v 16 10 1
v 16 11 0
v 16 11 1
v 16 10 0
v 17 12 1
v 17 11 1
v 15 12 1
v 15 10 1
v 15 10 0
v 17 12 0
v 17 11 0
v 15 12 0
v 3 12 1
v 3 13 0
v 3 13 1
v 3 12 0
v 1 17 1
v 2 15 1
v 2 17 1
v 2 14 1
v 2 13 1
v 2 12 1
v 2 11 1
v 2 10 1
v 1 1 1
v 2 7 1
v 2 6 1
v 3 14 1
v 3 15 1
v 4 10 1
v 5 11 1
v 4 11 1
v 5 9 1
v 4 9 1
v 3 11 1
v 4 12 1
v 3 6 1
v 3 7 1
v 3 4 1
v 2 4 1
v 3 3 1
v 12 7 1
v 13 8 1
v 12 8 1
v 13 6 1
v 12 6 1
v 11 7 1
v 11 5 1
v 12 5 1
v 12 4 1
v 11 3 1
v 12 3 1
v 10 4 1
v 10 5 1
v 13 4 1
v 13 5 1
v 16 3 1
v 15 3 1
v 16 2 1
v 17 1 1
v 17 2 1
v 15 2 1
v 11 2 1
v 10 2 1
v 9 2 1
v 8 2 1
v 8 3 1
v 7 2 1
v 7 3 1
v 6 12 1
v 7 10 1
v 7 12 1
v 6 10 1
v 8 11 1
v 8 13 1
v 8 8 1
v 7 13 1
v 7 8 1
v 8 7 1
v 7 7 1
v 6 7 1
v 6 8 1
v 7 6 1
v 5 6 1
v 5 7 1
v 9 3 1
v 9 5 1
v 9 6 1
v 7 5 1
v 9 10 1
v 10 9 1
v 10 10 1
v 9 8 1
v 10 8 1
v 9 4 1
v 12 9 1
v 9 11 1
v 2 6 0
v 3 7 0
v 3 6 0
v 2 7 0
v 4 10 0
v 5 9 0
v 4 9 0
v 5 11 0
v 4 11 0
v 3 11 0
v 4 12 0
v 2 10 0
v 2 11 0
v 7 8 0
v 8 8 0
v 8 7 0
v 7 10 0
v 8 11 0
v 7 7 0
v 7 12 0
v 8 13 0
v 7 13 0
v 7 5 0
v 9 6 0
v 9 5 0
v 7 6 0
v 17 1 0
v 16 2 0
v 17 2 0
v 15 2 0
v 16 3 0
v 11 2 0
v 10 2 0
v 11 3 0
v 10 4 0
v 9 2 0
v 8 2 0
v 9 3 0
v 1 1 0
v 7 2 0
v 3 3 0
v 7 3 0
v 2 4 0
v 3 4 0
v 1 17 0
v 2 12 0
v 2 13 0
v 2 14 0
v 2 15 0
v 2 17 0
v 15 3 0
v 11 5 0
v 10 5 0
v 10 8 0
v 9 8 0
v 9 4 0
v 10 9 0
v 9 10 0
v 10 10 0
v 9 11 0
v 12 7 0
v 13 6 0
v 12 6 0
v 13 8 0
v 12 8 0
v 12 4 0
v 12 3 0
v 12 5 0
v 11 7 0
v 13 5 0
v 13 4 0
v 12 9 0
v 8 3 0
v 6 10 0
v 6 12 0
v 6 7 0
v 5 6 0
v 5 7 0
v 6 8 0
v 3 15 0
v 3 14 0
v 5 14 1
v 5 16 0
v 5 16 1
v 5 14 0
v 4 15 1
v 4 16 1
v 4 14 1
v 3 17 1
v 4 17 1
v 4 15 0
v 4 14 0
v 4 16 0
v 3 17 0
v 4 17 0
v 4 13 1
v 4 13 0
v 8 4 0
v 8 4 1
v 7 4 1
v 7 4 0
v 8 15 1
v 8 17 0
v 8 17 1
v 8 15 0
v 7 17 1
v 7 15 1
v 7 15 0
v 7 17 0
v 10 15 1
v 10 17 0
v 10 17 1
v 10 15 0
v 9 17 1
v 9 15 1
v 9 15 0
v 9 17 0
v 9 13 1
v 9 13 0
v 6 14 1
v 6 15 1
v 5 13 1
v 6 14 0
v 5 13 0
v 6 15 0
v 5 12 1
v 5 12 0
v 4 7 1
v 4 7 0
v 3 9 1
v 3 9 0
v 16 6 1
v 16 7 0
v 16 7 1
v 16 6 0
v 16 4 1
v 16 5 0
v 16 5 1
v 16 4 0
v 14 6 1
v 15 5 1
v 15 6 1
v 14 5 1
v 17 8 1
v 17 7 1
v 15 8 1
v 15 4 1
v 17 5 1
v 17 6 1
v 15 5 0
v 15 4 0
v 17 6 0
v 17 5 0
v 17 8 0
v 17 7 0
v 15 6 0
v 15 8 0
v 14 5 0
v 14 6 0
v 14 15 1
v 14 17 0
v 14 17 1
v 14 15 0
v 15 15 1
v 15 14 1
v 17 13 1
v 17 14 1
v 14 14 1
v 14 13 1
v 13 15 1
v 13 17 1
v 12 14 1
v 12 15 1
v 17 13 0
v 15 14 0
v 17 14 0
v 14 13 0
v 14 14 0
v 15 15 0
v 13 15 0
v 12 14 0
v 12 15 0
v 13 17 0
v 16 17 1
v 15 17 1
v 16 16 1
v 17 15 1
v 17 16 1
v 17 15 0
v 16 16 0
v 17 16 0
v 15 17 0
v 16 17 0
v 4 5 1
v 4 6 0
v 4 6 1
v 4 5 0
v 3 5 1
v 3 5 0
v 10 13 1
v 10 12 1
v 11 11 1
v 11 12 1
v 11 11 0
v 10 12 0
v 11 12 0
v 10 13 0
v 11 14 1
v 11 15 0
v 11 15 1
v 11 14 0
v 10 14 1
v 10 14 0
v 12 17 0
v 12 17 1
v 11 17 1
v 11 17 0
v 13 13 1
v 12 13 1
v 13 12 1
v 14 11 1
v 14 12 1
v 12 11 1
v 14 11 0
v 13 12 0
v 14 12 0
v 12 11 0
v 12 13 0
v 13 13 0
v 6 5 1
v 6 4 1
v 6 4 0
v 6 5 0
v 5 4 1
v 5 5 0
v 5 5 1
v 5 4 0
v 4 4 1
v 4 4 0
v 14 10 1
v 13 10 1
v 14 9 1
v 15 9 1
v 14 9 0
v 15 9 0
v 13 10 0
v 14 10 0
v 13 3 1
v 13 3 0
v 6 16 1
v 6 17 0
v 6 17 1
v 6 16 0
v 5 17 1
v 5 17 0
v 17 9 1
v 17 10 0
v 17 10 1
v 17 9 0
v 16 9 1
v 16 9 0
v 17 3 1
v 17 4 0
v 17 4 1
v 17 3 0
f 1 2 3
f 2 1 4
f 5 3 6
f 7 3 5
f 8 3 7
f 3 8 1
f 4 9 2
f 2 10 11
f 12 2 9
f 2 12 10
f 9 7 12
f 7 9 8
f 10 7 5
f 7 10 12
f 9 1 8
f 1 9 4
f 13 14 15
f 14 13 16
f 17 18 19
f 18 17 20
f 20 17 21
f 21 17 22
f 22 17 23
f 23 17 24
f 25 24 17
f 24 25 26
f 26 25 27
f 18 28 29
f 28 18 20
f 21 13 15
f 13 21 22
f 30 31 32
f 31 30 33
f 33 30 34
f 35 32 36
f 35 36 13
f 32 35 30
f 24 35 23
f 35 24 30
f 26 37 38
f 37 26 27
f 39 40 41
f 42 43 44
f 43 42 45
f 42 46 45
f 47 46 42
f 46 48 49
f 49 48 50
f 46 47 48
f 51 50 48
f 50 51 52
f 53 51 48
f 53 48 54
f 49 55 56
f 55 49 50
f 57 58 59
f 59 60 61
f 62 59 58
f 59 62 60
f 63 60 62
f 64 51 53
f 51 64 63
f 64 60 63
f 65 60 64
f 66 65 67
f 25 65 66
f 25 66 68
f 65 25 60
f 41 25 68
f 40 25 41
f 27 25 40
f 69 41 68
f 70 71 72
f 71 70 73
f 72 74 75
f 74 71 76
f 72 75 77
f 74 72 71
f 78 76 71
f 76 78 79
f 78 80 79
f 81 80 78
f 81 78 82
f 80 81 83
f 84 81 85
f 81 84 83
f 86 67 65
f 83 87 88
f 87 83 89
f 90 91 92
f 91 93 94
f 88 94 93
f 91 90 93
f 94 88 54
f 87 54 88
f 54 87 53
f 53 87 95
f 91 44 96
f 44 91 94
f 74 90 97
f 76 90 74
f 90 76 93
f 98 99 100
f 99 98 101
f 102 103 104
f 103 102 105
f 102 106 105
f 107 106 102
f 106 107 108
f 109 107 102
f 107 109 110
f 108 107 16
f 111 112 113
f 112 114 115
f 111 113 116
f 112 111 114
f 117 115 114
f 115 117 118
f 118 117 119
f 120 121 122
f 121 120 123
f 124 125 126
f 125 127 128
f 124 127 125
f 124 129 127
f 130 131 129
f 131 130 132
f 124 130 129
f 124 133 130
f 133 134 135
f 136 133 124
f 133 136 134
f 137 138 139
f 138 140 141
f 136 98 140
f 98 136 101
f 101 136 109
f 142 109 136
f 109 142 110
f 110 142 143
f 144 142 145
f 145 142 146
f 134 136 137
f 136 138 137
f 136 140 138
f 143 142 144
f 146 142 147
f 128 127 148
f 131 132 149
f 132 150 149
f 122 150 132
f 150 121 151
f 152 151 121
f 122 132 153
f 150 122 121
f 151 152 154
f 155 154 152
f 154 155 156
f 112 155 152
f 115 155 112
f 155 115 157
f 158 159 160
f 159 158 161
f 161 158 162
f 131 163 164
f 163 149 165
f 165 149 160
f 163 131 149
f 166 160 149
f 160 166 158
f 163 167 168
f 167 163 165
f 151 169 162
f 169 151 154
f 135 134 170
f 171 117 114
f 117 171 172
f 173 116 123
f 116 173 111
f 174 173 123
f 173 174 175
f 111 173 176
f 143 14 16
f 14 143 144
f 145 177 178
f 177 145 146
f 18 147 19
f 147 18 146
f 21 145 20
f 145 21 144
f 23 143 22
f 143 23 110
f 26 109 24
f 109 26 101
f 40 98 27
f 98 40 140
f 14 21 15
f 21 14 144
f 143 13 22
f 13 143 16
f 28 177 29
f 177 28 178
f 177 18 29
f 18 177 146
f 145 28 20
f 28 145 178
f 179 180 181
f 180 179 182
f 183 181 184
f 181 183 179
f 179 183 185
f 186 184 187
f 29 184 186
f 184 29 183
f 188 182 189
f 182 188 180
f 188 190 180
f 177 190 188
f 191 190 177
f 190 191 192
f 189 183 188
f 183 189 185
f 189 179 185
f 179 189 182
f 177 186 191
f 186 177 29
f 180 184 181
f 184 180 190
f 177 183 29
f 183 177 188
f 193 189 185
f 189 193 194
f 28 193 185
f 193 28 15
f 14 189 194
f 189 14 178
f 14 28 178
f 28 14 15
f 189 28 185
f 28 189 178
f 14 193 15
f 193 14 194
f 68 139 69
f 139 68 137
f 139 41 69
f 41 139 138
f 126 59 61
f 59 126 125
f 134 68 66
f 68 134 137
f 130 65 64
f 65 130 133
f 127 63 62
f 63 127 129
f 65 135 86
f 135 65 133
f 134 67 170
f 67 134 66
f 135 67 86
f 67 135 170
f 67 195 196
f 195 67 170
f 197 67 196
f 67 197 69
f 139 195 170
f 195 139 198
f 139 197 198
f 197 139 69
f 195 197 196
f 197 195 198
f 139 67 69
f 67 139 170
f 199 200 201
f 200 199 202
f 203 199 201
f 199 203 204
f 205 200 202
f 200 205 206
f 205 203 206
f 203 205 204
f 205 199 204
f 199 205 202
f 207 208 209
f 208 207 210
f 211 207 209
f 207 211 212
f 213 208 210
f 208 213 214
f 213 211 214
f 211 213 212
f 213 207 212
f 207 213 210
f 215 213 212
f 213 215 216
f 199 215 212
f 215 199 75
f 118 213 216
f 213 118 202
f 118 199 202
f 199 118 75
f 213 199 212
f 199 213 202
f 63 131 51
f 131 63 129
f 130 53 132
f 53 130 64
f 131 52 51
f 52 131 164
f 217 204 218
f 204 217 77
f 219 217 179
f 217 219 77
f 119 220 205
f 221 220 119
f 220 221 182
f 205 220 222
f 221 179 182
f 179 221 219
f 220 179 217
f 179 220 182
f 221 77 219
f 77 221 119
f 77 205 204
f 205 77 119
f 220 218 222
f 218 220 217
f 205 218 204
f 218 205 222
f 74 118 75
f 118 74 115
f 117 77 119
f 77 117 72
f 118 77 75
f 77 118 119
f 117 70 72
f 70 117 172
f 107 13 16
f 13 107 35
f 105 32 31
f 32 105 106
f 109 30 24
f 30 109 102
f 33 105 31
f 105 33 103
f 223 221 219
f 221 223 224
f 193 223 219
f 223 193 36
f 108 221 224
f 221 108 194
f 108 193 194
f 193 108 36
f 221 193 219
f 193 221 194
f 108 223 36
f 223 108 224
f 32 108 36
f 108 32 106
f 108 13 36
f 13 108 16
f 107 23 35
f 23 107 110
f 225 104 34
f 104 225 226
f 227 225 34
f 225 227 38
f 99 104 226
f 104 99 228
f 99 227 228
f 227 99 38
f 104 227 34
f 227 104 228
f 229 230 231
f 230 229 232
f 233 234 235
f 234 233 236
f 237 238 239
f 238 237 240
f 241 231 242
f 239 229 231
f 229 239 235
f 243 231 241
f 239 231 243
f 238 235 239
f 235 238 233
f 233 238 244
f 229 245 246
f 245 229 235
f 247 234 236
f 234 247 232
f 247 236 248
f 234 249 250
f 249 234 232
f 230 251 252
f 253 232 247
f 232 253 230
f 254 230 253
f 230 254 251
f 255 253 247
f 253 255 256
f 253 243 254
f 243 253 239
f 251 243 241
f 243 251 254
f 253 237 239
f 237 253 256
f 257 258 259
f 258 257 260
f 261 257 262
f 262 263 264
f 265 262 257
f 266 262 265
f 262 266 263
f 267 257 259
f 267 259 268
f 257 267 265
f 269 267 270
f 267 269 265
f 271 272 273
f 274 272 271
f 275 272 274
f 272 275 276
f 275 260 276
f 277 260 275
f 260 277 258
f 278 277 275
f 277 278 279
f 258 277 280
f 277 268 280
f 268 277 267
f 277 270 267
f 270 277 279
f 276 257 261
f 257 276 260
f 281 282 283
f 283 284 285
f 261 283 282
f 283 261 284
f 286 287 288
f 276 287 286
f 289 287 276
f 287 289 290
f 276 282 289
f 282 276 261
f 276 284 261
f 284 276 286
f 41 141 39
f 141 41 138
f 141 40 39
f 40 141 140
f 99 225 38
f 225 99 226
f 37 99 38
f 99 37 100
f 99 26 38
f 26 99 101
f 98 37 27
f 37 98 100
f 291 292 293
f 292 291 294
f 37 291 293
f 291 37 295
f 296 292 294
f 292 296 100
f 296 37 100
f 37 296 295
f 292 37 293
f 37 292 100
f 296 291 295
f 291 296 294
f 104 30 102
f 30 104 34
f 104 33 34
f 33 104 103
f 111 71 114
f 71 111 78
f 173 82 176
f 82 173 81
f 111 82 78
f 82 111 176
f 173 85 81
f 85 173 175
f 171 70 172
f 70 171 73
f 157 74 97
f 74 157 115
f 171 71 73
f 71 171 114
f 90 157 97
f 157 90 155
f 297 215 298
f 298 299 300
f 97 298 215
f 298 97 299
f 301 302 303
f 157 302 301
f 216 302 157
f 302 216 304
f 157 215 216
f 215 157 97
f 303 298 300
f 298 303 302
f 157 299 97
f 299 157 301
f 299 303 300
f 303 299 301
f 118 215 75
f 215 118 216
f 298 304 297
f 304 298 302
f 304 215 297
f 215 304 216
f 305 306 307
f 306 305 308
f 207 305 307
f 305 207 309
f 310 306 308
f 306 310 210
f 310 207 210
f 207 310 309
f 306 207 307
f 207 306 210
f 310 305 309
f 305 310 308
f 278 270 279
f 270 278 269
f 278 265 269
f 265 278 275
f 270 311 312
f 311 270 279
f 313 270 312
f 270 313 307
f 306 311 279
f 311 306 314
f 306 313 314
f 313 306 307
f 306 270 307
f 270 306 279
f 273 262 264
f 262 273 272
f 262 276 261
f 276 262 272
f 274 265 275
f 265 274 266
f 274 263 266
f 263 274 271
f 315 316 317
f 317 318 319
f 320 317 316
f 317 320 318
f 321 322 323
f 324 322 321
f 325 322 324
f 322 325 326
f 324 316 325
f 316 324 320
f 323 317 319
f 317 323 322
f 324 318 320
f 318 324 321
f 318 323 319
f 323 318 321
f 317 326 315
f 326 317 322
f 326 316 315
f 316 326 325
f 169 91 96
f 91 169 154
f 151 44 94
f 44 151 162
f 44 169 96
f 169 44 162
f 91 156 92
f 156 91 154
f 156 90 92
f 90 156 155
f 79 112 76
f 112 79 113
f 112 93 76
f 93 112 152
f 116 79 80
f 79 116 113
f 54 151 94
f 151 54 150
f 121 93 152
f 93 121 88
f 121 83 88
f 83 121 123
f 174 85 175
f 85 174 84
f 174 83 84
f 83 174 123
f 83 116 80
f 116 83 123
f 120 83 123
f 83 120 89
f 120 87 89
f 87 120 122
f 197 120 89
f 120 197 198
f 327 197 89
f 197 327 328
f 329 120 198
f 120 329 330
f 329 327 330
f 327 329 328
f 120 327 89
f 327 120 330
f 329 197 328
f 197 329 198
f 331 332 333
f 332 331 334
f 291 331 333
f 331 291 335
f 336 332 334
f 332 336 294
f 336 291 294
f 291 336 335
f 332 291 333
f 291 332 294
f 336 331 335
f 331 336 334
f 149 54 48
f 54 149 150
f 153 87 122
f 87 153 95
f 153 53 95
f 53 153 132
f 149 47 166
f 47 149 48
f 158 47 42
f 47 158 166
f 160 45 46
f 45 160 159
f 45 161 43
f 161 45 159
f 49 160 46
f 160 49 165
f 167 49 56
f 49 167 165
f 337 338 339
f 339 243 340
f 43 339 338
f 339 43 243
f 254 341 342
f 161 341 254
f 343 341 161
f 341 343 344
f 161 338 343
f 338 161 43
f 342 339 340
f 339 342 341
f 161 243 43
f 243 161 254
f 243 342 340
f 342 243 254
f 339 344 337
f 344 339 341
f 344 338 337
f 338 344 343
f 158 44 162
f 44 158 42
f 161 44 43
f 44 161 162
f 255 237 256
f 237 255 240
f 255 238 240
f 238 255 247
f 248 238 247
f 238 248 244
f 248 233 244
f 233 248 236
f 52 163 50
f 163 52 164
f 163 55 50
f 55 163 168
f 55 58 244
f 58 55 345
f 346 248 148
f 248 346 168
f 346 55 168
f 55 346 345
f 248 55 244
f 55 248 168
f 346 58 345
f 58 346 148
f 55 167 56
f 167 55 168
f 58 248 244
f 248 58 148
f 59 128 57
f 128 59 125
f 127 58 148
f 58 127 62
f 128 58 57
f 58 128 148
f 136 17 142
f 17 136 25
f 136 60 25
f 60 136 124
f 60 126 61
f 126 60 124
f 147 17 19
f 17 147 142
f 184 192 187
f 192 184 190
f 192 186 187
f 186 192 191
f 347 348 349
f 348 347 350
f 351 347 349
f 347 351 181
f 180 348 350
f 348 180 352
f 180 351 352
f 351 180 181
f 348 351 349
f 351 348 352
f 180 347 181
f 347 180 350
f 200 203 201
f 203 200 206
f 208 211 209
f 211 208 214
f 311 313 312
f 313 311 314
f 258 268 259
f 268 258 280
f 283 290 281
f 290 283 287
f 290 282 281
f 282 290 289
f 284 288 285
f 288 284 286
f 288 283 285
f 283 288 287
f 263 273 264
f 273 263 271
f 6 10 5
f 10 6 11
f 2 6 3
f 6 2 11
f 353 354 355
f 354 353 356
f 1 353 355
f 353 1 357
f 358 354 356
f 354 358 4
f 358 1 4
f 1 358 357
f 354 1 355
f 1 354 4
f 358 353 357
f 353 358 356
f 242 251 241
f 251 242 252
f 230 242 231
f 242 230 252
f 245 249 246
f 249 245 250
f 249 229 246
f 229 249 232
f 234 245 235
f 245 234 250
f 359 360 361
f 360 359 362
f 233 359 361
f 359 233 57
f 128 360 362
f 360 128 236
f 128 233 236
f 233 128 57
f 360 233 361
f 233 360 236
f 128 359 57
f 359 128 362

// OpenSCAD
// file: ../util/bitmap.scad
/*****************************************************************************
 * Module Bitmap Library
 * Modules to create bitmaps of unit squares from 1 or 2 dimensional vectors.
 *****************************************************************************
 * Copyright 2017 Chris Baker
 *
 * This program is free software: you can redistribute it and/or modify
 * it under the terms of the GNU Lesser General Public License as published by
 * the Free Software Foundation, either version 3 of the License, or
 * (at your option) any later version.
 *
 * This program is distributed in the hope that it will be useful,
 * but WITHOUT ANY WARRANTY; without even the implied warranty of
 * MERCHANTABILITY or FITNESS FOR A PARTICULAR PURPOSE.  See the
 * GNU Lesser General Public License for more details.
 *
 * You should have received a copy of the GNU Lesser General Public License
 * along with this program.  If not, see <http://www.gnu.org/licenses/>.
 *****************************************************************************
 * Usage:
 * Include this file with the "use" tag.
 * Depends on compat.scad library.
 *
 * API:
 *   1dbitmap(bitmap, center, expansion, vector_mode)
 *   2dbitmap(bitmap, center, expansion, vector_mode)
 *     Generate a 1 or 2-Dimensional field of modules based on the provided
 *     bitmap vector. See Bitmap Vectors below.
 *     The center flag determines whether to center the bitmap on the origin.
 *     The expansion value actually shrinks each cube in the x and y
 *     dimension by the specified amount.
 *     The vector_mode flag determines whether to create 3D solid geometry
 *     (unit cubes) or 2D vector geometry (squares).
 *
 * Bitmap Vectors:
 *   The bitmap vectors primarily provide boolean information.
 *   A module will be placed where these vectors have a postive value and
 *   skipped where they have a negative value. I.E. 0, -1, false, and undef
 *   are all equivalent and result in a skip. 1 and true are equivalent and
 *   result in a placed 1-unit module.
 *   Further, if the value is an integer it will be treated as a height for
 *   the module, allowing z-maps to be created.
 *   If the value is not an integer or boolean, it will be treated as a color
 *   reference. This can be a string or RGBA vector that will be used to
 *   color the module in the OpenSCAD preview window.
 *   In current versions of OpenSCAD, the color has no effect in the rendered
 *   view or STL output.
 *
 * Vector Mode:
 *   Although OpenSCAD supports generating 2D geometry, there are several
 *   caveats:
 *   - 2D and 3D geometry cannot be mixed
 *   - Extruding 2D geometry causes color information to be lost
 *   - All 2D geometry is projected onto the XY plane when rendering
 *   - Rendering also results in loss of color (same as 3D)
 *   - The SVG exporter is somewhat limited:
 *     - The pixel size of the image is hard-coded in the file
 *     - The title of the image is a generic string
 *     - The color selection for stroke and fill is fixed
 *     - The stroke-width is set to a large value that will cause overlap
 *     - The background is transparent
 *     - Only one path element is created with all of the geometry; there is
 *       no easy way to split up the geometry into multiple logical units.
 *     - These issues can mostly be resolved by hand-editing the file:
 *       - Remove or modify the width and height parameters from the svg
 *         element at the top of the file to provide better scaling.
 *       - Edit the title element at the top of the file to change the title.
 *       - Edit the stroke and fill parameters of the path element (these will
 *         probably be at the end of the file).
 *       - Set the stroke-width parameter for the path element to 0.
 *****************************************************************************/
use <compat.scad>

/*
 * 2dbitmap - Turn a 2D vector into a bitmap of cubes
 *
 * bitmap - 2D vector representing where to place each cube
 *          Value can either be boolean, z-height, or color
 * center - center cubes around the origin
 * expansion - size of gap around each pixel (screendoor)
 * vector_mode - create a 2D vector drawing instead of 3D extrusion
 */
module 2dbitmap(bitmap=[[1,0],[0,1]], center=false, expansion=0, vector_mode=false)
{
	ylen=len(bitmap)-1;

	for (y=[0:ylen]) {
		xlen=len(bitmap[y])-1;
		for (x=[0:xlen])
			translate([x-(center?xlen/2:0),ylen-y-(center?ylen/2:0),0])
				if (is_indexable(bitmap[y][x]))
					color(bitmap[y][x])
						if (vector_mode)
							square([1-expansion,1-expansion], center=center);
						else
							cube([1-expansion,1-expansion,1], center=center);
				else
					if (bitmap[y][x])
						if (vector_mode)
							square([1-expansion,1-expansion], center=center);
						else
							cube([1-expansion,1-expansion,clamp_nonnum(bitmap[y][x])], center=center);
	}
}

module 1dbitmap(bitmap=[1,0,1,0,1], center=false, expansion=0, vector_mode=false)
	2dbitmap([bitmap], center, expansion, vector_mode);

/*
 * Examples
 */

// 1D with z-height
translate([10,0,0]) scale([1,10,1])
	1dbitmap(bitmap=[1,1,0,2,0,0,3], expansion=.1);

// 1D with boolean
translate([-20,0,0]) scale([1,10,1])
	1dbitmap(bitmap=[true,false,true,false,true,true]);

// 2D with z-height
scale([2,2,1])
	2dbitmap(bitmap=[[1,0,2,1],[0,3,3,0],[1,1,0,1]],
		center=true);

// 1D with color
translate([0,-10,0]) scale([1,3,1])
	1dbitmap(bitmap=["red","white","blue",[0,0.3,0,0.5]]);

// 1D with color using 2D-vector-mode
translate([-7,-8,0]) scale([1,2])
	1dbitmap(bitmap=["red",0,"blue",0,"green"], vector_mode=true);
translate([-4.5,-10,0]) scale([1,2])
	1dbitmap(bitmap=["red",0,"blue",0,"green"], vector_mode=true, center=true);
// file: ../util/bitlib.scad
/*****************************************************************************
 * Bit Manipulation Library
 * Provides some useful bit manipulation functions.
 *****************************************************************************
 * Copyright 2017 Chris Baker
 *
 * This program is free software: you can redistribute it and/or modify
 * it under the terms of the GNU Lesser General Public License as published by
 * the Free Software Foundation, either version 3 of the License, or
 * (at your option) any later version.
 *
 * This program is distributed in the hope that it will be useful,
 * but WITHOUT ANY WARRANTY; without even the implied warranty of
 * MERCHANTABILITY or FITNESS FOR A PARTICULAR PURPOSE.  See the
 * GNU Lesser General Public License for more details.
 *
 * You should have received a copy of the GNU Lesser General Public License
 * along with this program.  If not, see <http://www.gnu.org/licenses/>.
 *****************************************************************************
 * Usage:
 * Include this file with the "use" tag.
 * When run on its own, all echo statements in this
 * library should print "true".
 *
 * API:
 *   bit(v,b)
 *     Return the truth value of the b'th bit of v.
 *
 *   check_bit_size(v,b,signed=false)
 *     Determine whether the value v can be represented
 *     with b bits (b must be positive).
 *     The signed flag indicates whether to include the
 *     sign bit in the determination; otherwise negative
 *     values will result in undef being returned.
 *
 *   xor(a,b)
 *     Return the value of a xor b.
 *     Handles arbitrary size values for a and b.
 *     Handles negative values as expected (a positive
 *     result will be returned unless a and b have
 *     differing signs).
 *
 * TODO:
 *  - Change echos to asserts (future OpenSCAD version)
 *  - Add more functions
 *
 *****************************************************************************/

//Return the truth value of the b'th bit of v
function bit(v,b) =
	((v==undef)||(b==undef)||(b<0))?undef:
	(floor(v / pow(2, b)) % 2)?true:false;

echo("*** bit() testcases ***");
echo(0,bit(0,0)==false);
echo(1,bit(-1,0)==true);
echo(2,bit(1,0)==true);
echo(3,[for (i=[0:63]) bit(0,i)]==[for (i=[0:63]) false]); //0=0...0
echo(4,[for (i=[0:63]) bit(-1,i)]==[for (i=[0:63]) true]); //-1=1...1
echo(5,[for (i=[1:63]) bit(1,i)]==[for (i=[1:63]) false]); //1=0...01
echo(6,[for (i=[0:7]) bit(85,i)?1:0]==[1,0,1,0,1,0,1,0]); //85=01010101
echo(7,[for (i=[0:7]) bit(170,i)?1:0]==[0,1,0,1,0,1,0,1]); //170=10101010
echo(8,[for (i=[0:7]) bit(165,i)?1:0]==[1,0,1,0,0,1,0,1]); //165=10100101
echo(9,[for (i=[0:7]) bit(56,i)?1:0]==[0,0,0,1,1,1,0,0]); //56=00111000
echo(10,[for (i=[0:7]) bit(-3,i)?1:0]==[1,0,1,1,1,1,1,1]); //-3=1...101
//(2^64)=0...01 0...0
echo(11,bit(pow(2,64),64)==true);
echo(12,[for (i=[0:63]) bit(pow(2,64),i)]==[for (i=[0:63]) false]);
echo(13,[for (i=[65:127]) bit(pow(2,64),i)]==[for (i=[1:63]) false]);
//-(2^64)=1...1 0...0
echo(14,[for (i=[0:63]) bit(-pow(2,64),i)]==[for (i=[0:63]) false]);
echo(15,[for (i=[64:127]) bit(-pow(2,64),i)]==[for (i=[0:63]) true]);
echo(16,bit(10,-1)==undef);
echo(17,bit(10,undef)==undef);
echo(18,bit(undef,3)==undef);

//return true if v can be represented in b bits
//if signed flag is set. the result will be adjusted
//to account for the needed sign bit
function check_bit_size(v,b,signed=false) =
	(b<0)?undef:
	(v==undef)?undef:
	(b==0)?false:
	(v==0)?true: //(b>0)
	(signed)?
		(v<0)?(-pow(2,b-1)<(v+1)):
			(pow(2,b-1)>(v+1)):
		(v<0)?undef:
			(pow(2,b)>v);

echo("*** check_bit_size() testcases ***");
echo(0,check_bit_size(-1,2)==undef);
echo(1,check_bit_size(2,-4)==undef);
echo(2,check_bit_size(2,-4,signed=true)==undef);
echo(3,check_bit_size(0,0)==false);
echo(4,check_bit_size(0,1)==true);
echo(5,check_bit_size(1,0)==false);
echo(6,check_bit_size(1,1)==true);
echo(7,check_bit_size(7,3)==true);
echo(8,check_bit_size(8,3)==false);
echo(9,check_bit_size(1,3)==true);
echo(10,check_bit_size(256,8)==false);
echo(11,check_bit_size(255,8)==true);
echo(12,check_bit_size(10,2)==false);
echo(13,check_bit_size(10,4)==true);
echo(14,check_bit_size(-10,2,signed=true)==false);
echo(15,check_bit_size(-10,4,signed=true)==false);
echo(16,check_bit_size(-10,5,signed=true)==true);
echo(17,check_bit_size(-1,0,signed=true)==false);
echo(18,check_bit_size(-1,1,signed=true)==true);
echo(19,check_bit_size(0,0,signed=true)==false);
echo(20,check_bit_size(0,1,signed=true)==true);
echo(21,check_bit_size(-2,2,signed=true)==true);
echo(22,check_bit_size(-3,2,signed=true)==false);
echo(23,check_bit_size(-3,3,signed=true)==true);
echo(24,check_bit_size(-8,3,signed=true)==false);
echo(25,check_bit_size(-8,4,signed=true)==true);
echo(26,check_bit_size(undef,4)==undef);
echo(27,check_bit_size(undef,4,signed=true)==undef);

//return the value of a xor b
//runs recursively until all bits of a and b are exhausted
function xor(a,b,i=0) =
	((a==undef)||(b==undef))?undef:
	let (c=bit(a,i), d=bit(b,i),
		 v=((c||d) && !(c&&d))?pow(2,i):0)
		(check_bit_size(a,i,signed=true) &&
		 check_bit_size(b,i,signed=true))?
			-v: //special case for sign bit
			v+xor(a,b,i+1); //recursively add powers of 2

echo("*** xor() testcases ***");
echo(0,xor(42,0)==42);
echo(1,xor(42,42)==0);
echo(2,xor(169,238)==71); //10101001^11101110=01000111=71
echo(3,xor(238,169)==71);
echo(4,xor(42,238)==196); //00101010^11101110=11000100=196
echo(5,xor(169,42)==131); //10101001^00101010=10000011=131
echo(6,xor(-8,-10)==14); //11000^10110=01110=14
echo(7,xor(-7,-10)==15); //11001^10110=01111=15
echo(8,xor(9,-10)==-1); //01001^10110=11111=-1
echo(9,xor(9,-12)==-3); //01001^10100=11101=-3
echo(10,xor(undef,0)==undef);
// file: ../util/stringlib.scad
/*****************************************************************************
 * String Manipulation Library
 * Provides some useful string manipulation functions.
 *****************************************************************************
 * Copyright 2017 Chris Baker
 *
 * This program is free software: you can redistribute it and/or modify
 * it under the terms of the GNU Lesser General Public License as published by
 * the Free Software Foundation, either version 3 of the License, or
 * (at your option) any later version.
 *
 * This program is distributed in the hope that it will be useful,
 * but WITHOUT ANY WARRANTY; without even the implied warranty of
 * MERCHANTABILITY or FITNESS FOR A PARTICULAR PURPOSE.  See the
 * GNU Lesser General Public License for more details.
 *
 * You should have received a copy of the GNU Lesser General Public License
 * along with this program.  If not, see <http://www.gnu.org/licenses/>.
 *****************************************************************************
 * Usage:
 * Include this file with the "use" tag.
 * When run on its own, all echo statements in this library should print
 * "true".
 *
 * API:
 *   atoi(a)
 *     Convert the string of numerals, a, to a vector of individual decimal
 *     numbers.
 *
 *   ascii_to_vec(a)
 *     Convert the ASCII string, a, into a vector of decimal numbers.
 *
 * TODO:
 *  - Change echos to asserts (future OpenSCAD version)
 *
 *****************************************************************************/

/*
 * atoi - convert ASCII numerals to a vector of individual decimal numbers
 *
 * a - the ASCII string of numerals
 */
function atoi(a) = (len(a)==undef)?undef:
[
	let (val = search(a, "0123456789"))
		for (i = val) i
];

echo("*** atoi() testcases ***");
echo(ascii_to_vec(undef)==undef);
echo(ascii_to_vec(true)==undef);
echo(ascii_to_vec(false)==undef);
echo(ascii_to_vec("")==[]);
echo(atoi("0")==[0]);
echo(atoi("1")==[1]);
echo(atoi("2")==[2]);
echo(atoi("3")==[3]);
echo(atoi("4")==[4]);
echo(atoi("5")==[5]);
echo(atoi("6")==[6]);
echo(atoi("7")==[7]);
echo(atoi("8")==[8]);
echo(atoi("9")==[9]);
echo(atoi("123")==[1,2,3]);
echo(atoi("1a23b")==[1,2,3]); //degenerate case, don't really care too much about the result

/*
 * ascii_to_vec - convert ASCII string to decimal vector
 *
 * a - the ASCII string to vectorize
 */
function ascii_to_vec(a) = (len(a)==undef)?undef:
[
	let (val = search(a, "\x01\x02\x03\x04\x05\x06\x07\x08\x09\x0a\x0b\x0c\x0d\x0e\x0f\x10\x11\x12\x13\x14\x15\x16\x17\x18\x19\x1a\x1b\x1c\x1d\x1e\x1f !\"#$%&'()*+,-./0123456789:;<=>?@ABCDEFGHIJKLMNOPQRSTUVWXYZ[\\]^_`abcdefghijklmnopqrstuvwxyz{|}~\x7f"))
		for (i = val) i+1
];

echo("*** ascii_to_vec() testcases ***");
echo(ascii_to_vec(undef)==undef);
echo(ascii_to_vec(true)==undef);
echo(ascii_to_vec(false)==undef);
echo(ascii_to_vec("")==[]);
echo(ascii_to_vec("0")==[48]);
echo(ascii_to_vec("a")==[97]);
echo(ascii_to_vec("0123456789")==[48,49,50,51,52,53,54,55,56,57]);
echo(ascii_to_vec("The quick brown fox jumped over the lazy dog.")
	==[84,104,101,32,113,117,105,99,107,32,98,114,111,119,110,32,102,111,120,32,106,117,109,112,101,100,32,111,118,101,114,32,116,104,101,32,108,97,122,121,32,100,111,103,46]);
// main file
/*****************************************************************************
 * Data Matrix Symbol Library
 * Generates Data Matrix 2D barcodes
 *****************************************************************************
 * Copyright 2017 Chris Baker
 *
 * This program is free software: you can redistribute it and/or modify
 * it under the terms of the GNU Lesser General Public License as published by
 * the Free Software Foundation, either version 3 of the License, or
 * (at your option) any later version.
 *
 * This program is distributed in the hope that it will be useful,
 * but WITHOUT ANY WARRANTY; without even the implied warranty of
 * MERCHANTABILITY or FITNESS FOR A PARTICULAR PURPOSE.  See the
 * GNU Lesser General Public License for more details.
 *
 * You should have received a copy of the GNU Lesser General Public License
 * along with this program.  If not, see <http://www.gnu.org/licenses/>.
 *****************************************************************************
 * Usage:
 * Include this file with the "use" tag.
 *
 * Library Dependencies:
 * - util/stringlib.scad
 * - util/bitlib.scad
 * - util/bitmap.scad
 * - util/datamatrix-util.scad
 *   - util/compat.scad
 *   - util/reed-solomon-datamatrix.scad
 *     - util/bitlib.scad
 *
 * API:
 *   data_matrix(bytes, mark=1, space=0, quiet_zone=0, pullback=0.003,
 *     vector_mode=false, center=false, expert_mode=false)
 *     Generates a DataMatrix symbol with contents specified by bytes.
 *     The mark, space, quiet_zone, and pullback parameters can be used to
 *     change the appearance of the symbol. A negative pullback will enlarge
 *     the modules and cause them to blend together. See the bitmap library
 *     for more details.
 *     The vector_mode flag determines whether to create 2D vector artwork
 *     instead of 3D solid geometry. See notes/caveats in the bitmap library.
 *     The center flag indicates whether to center the barcode on the origin.
 *     The expert_mode flag should only be used by experts.
 *
 *   data_matrix_size(bytes, expert_mode=false)
 *     Compute the overall dimensions of the barcode (including the quiet
 *     area). The value is returned as a 2-vector (e.g. [12,12]).
 *     The bytes value should be the same as what you would pass to the
 *     data_matrix module to actually generate the symbol. (That is, it should
 *     be an array generated by one of the helper functions below.)
 *
 *   dm_ascii(string, frob_digits=true)
 *     Returns a suitable byte array representing string, encoded in
 *     DataMatrix ASCII encoding.
 *     Pairs of digits are normally compacted, but this can be forcibly
 *     disabed by setting frob_digits=false.
 *     See ascii_mode() below, but ASCII is the default.
 *
 *   dm_text(string)
 *     Returns a suitable byte array representing string, encoded in
 *     DataMatrix text encoding.
 *     See text_mode() below.
 *
 *   dm_c40(string)
 *     Returns a suitable byte array representing string, encoded in
 *     DataMatrix C40 encoding.
 *     See c40_mode() below.
 *
 *   dm_base256(data, pos, fills_symbol=false)
 *     Encode the data byte vector using DataMatrix base-256 encoding
 *     algorithm (mod 255). A 1 or 2 byte length prefix is prepended to the
 *     data automatically.
 *     The nature of the algorithm means that it needs pos to be the starting
 *     byte position of the data bytes within the overall symbol data field.
 *     See also helper function dm_base256_append().
 *     The fills_symbol flag can be used by experts.
 *     See base256_mode() below.
 *
 *   dm_base256_append(preceding_data, byte_data, fills_symbol=false)
 *     Helper function to append dm_base256(byte_data, _pos_) to
 *     preceding_data, where _pos_ is determined automatically.
 *     The final byte of preceding_data must be 'base256_mode()'.
 *     The fills_symbol flag can be used by experts.
 *
 * TODO:
 *  - Add support for 32x32, 36x36, 40x40, 44x44, 48x48
 *  - Add support for rectangular matrixes
 *  - Add support for larger sizes than 48x48
 *  - Add other encoding modes
 *
 *****************************************************************************/
use <../util/stringlib.scad>
use <../util/bitlib.scad>
use <../util/bitmap.scad>
use <../util/datamatrix-util.scad>

/* Some definitions of useful data bytes that can be
   concatenated into your byte string */
function EOM() = 129; // end-of-message (first padding byte)
function c40_mode() = 230; // begin C40 encoding mode
function base256_mode() = 231; // begin base-256 (byte) encoding mode
function fnc1_mode() = 232; // begin FNC1 (GS1-DataMatrix) encoding mode
function text_mode() = 239; // begin text encoding mode
function ascii_mode() = 254; // return to ASCII encoding mode
function unused() = 0; // 0 is explicitly not used as a control code

//take the ASCII byte vector and convert it to
//the DM ASCII encoding
//compacting of digit pairs can be forcibly disabled
function frobulate(vec, frob_digits=true, i=0) =
	(i==len(vec))?[]: //terminate recursion
		let(
			inc=frob_digits?
				(
					//check for digit pairs
					((len(vec)>(i+1)) &&
					 (vec[i]>=48)&&(vec[i]<=57) &&
					 (vec[i+1]>=48)&&(vec[i+1]<=57))?2:1
				):1,
			val=(inc==2)?
				(vec[i]-48)*10+(vec[i+1]-48)+130:
				vec[i]+1
		)
		concat(val, frobulate(vec, frob_digits, i+inc));

/*
 * dm_ascii - convert ASCII string to byte vector encoded in
 *   DataMatrix ASCII mode
 *
 * string - the ASCII string to encode
 * frob_digits - whether to compact digit pairs
 */
function dm_ascii(string, frob_digits=true) =
	let (vec=ascii_to_vec(string))
	frobulate(vec,frob_digits);

function ascii_to_text(a) =
	let (
		bytearray =
		[
			for (val=search(a, " 0123456789abcdefghijklmnopqrstuvwxyz\x01\x02\x03\x04\x05\x06\x07\x08\x09\x0a\x0b\x0c\x0d\x0e\x0f\x10\x11\x12\x13\x14\x15\x16\x17\x18\x19\x1a\x1b\x1c\x1d\x1e\x1f!\"#$%&'()*+,-./:;<=>?@[\\]^_`ABCDEFGHIJKLMNOPQRSTUVWXYZ{|}~\x7f"))
				(val>=95)?[2,val-95]:
				(val>=68)?[1,val-68]:
				(val>=37)?[0,val-37+1]:
				[val+3]
		]
	) [ for (B=bytearray, b=B) b ];

function ascii_to_c40(a) =
	let (
		bytearray =
		[
			for (val=search(a, " 0123456789ABCDEFGHIJKLMNOPQRSTUVWXYZ\x01\x02\x03\x04\x05\x06\x07\x08\x09\x0a\x0b\x0c\x0d\x0e\x0f\x10\x11\x12\x13\x14\x15\x16\x17\x18\x19\x1a\x1b\x1c\x1d\x1e\x1f!\"#$%&'()*+,-./:;<=>?@[\\]^_`abcdefghijklmnopqrstuvwxyz{|}~\x7f"))
				(val>=95)?[2,val-95]:
				(val>=68)?[1,val-68]:
				(val>=37)?[0,val-37+1]:
				[val+3]
		]
	) [ for (B=bytearray, b=B) b ];

/*
 * dm_text - convert ASCII string to byte vector encoded in
 *   DataMatrix text mode
 *
 * string - the ASCII string to encode
 */
function dm_text(string) =
	let (
		bytearray = ascii_to_text(string),
		bytelen = len(bytearray)
	) [	for (
			i=[0:3:bytelen-1],
			packedval=bytearray[i]*1600+bytearray[i+1]*40+bytearray[i+2]+1,
			bytepair=[floor(packedval/256),packedval%256]
		) bytepair ];

/*
 * dm_c40 - convert ASCII string to byte vector encoded in
 *   DataMatrix C40 mode
 *
 * string - the ASCII string to encode
 */
function dm_c40(string) =
	let (
		bytearray = ascii_to_c40(string),
		bytelen = len(bytearray)
	) [	for (
			i=[0:3:bytelen-1],
			packedval=bytearray[i]*1600+bytearray[i+1]*40+bytearray[i+2]+1,
			bytepair=[floor(packedval/256),packedval%256]
		) bytepair ];

/*
 * dm_base256 - encode byte vector in DataMatrix base-256 mode
 *
 * data - the byte data to encode
 * pos - the starting byte position of the data within the
 *   overall symbol data field
 *   note: at least base256_mode()=231 will precede the byte
 *   data so this value can not be 0
 *   see also: dm_base256_append()
 * fills_symbol - indicates that the data vector fills out
 *   the remainder of the symbol by itself -- this attribute
 *   is a little bit awkward and I'm not sure that it is
 *   really necessary; so, if in doubt, leave it false
 */
function dm_base256(data, pos=1, fills_symbol=false) =
	let(l = len(data))
		(l==0)?undef:
		let(prefix =
			(fills_symbol)?[0]:
			(l<250)?[l]:
			[249+floor(l/250),l%250],
			message=concat(prefix,data)
		)
		[
			for (i=[0:len(message)-1])
				((((149*(i+pos+1))%255)+1+message[i])%256)
		];

/*
 * dm_base256_append - encode byte vector in DataMatrix
 *	 base-256 mode and append it to some existing data
 *
 * preceding_data - the pre-existing data to append this to
 *   note: must end with base256_mode()=231
 * byte_data - the byte data to encode
 * fills_symbol - indicates that the data vector fills out
 *   the remainder of the symbol by itself -- this attribute
 *   is a little bit awkward and I'm not sure that it is
 *   really necessary; so, if in doubt, leave it false
 */
function dm_base256_append(preceding_data, byte_data, fills_symbol=false) =
	let (l = len(preceding_data))
		(preceding_data[l-1]!=base256_mode())?undef:
		concat(preceding_data, dm_base256(byte_data, l, fills_symbol));

/*
 * data_matrix_size - Compute the overall dimensions of the barcode
 *   including the quiet area.
 *   Note: does not account for large pullback values -- normally these should
 *   be insignificant.
 *
 * bytes - data bytes to encode (same as would be passed to data_matrix func)
 *
 * expert_mode - only use this if you are an expert
 */
function data_matrix_size(bytes, expert_mode=false) =
	let(properties=(expert_mode)?
			dm_get_props_by_total_size(len(bytes)):
			dm_get_props_by_data_size(len(bytes)))
		dm_prop_dimensions(properties)+[2,2];

/*
 * data_matrix - Generate a DataMatrix barcode
 *
 * bytes - data bytes to encode
 *
 * mark - mark representation
 * space - space representation
 * quiet_zone - representation for the quiet zone
 * pullback - reduce each module size by this amount
 *   (see documentation in bitmap.scad)
 *
 * vector_mode - create a 2D vector drawing instead of 3D extrusion
 * center - indicates whether to center the barcode on the origin
 * expert_mode - only use this if you are an expert
 */
module data_matrix(bytes, mark=1, space=0, quiet_zone=0, pullback=0.003,
	vector_mode=false, center=false, expert_mode=false)
{
	//Note: throughout the code, where 2dbitmap is used, the center parameter
	//is passed to it in order to get the correct z-height centering.
	//However, it would be a challenge to further center each codeword in the
	//x and y direction since this would depend on the symbol size.
	//Instead, it is easier to adjust each bitmap by [word.x/2, word.y/2] to
	//bring it back to its original, non-centered position and then shift
	//the entire barcode at the end by [dims.x/2, dims.y/2].
	//When you see "offs" immediately preceding a call to 2dbitmap, this is
	//its purpose.

	properties = (expert_mode)?
		dm_get_props_by_total_size(len(bytes)):
		dm_get_props_by_data_size(len(bytes));
	data_bytes = (expert_mode)?bytes:dm_ecc(dm_pad(bytes));
	size=dm_prop_dimensions(properties);

	if (properties==undef)
		if (expert_mode)
			echo("ERROR: Are you sure you're an expert?");
		else
			echo(str("ERROR: Could not determine symbol dimensions. ",
				len(bytes), " bytes of data might be an unsupported size."));

	corner=dm_prop_corner(properties);
	xadj=dm_prop_x_adjust(properties);
	yadj=dm_prop_y_adjust(properties);

	//echo(str("DEBUG size=", size, " xadj=", xadj, " yadj=", yadj, " corner=", corner));

	//generate a single codeword as a 2D array
	//suitable for passing to the 2dbitmap module
	function dm_codeword(x, M=1, S=0) = [
		[bit(x,7)?M:S, bit(x,6)?M:S, 0],
		[bit(x,5)?M:S, bit(x,4)?M:S, bit(x,3)?M:S],
		[bit(x,2)?M:S, bit(x,1)?M:S, bit(x,0)?M:S]
	];

	//split the codeword into two, selecting columns
	function colsplit(s, x) =
	[
		for(i=[0:2]) // iterate over all 3 rows
		[
			// select left-most 1 or 2 columns if x is positive
			// select right-most 1 or 2 columns if x is negative
			for (j=[((x<0)?-x:0) : ((x<0)?2:x-1)])
				s[i][j]
		]
	];

	//split the codeword into two, selecting rows
	function rowsplit(s, y) =
	[
		// select top-most 1 or 2 rows if y is positive
		// select bottom-most 1 or 2 rows if y is negative
		for (i=[((y<0)?3+y:0) : ((y<0)?2:2-y)])
			s[i]
	];

	//split the codeword into two parts for the
	//upper right and lower left corner
	//todo: calculate corner shape automatically
	module drawcorner1(s, size, corner)
	{
		if (2==corner)
		{
			//offs cancels the x/y centering, leaving only the z centering
			offs=center?[+2,+1,0]:[0,0,0];
			translate(offs+[size.x-6,-2,0])
				2dbitmap(
					[
						[s[1][1],s[1][2],s[2][0],s[2][1]],
						[0,0,0,s[2][2]]
					],
					pullback=pullback, vector_mode=vector_mode,
					center=center);
		}
		else /* 1==corner */
		{
			//offs cancels the x/y centering, leaving only the z centering
			offs=center?[-3,-2,0]:[-4,-4,0];
			translate(offs+[size.x,0,0])
				2dbitmap(
					[
						[s[1][1],s[1][2]],
						[0,s[2][0]],
						[0,s[2][1]],
						[0,s[2][2]]
					],
					pullback=pullback, vector_mode=vector_mode,
					center=center);
		}
	}

	module drawcorner2(s, size, corner)
	{
		if (2==corner)
		{
			//offs cancels the x/y centering, leaving only the z centering
			offs=center?[0.5,3.5,0]:[0,2,0];
			translate(offs+[0,-size.y,0])
				2dbitmap(
					[
						[s[0][0]],
						[s[0][1]],
						[s[1][0]]
					],
					pullback=pullback, vector_mode=vector_mode,
					center=center);
		}
		else /* 1==corner */
		{
			//offs cancels the x/y centering, leaving only the z centering
			offs=center?[1.5,2.5,0]:[0,2,0];
			translate(offs+[0,-size.y,0])
				2dbitmap(
					[
						[s[0][0],s[0][1],s[1][0]]
					],
					pullback=pullback, vector_mode=vector_mode,
					center=center);
		}
	}

	//check whether x,y have entered the upper-right corner
	//codeword shape (based on corner type)
	function check_corner_collision(corner, size, x, y)=
		(1==corner)?
			((y+3>0) && (x+10>size.x)):
		(2==corner)?
			((y+4>0) && (x+10>size.x)):
		false;

	//generate a filler shape for unused area
	function unusedshape(size, M=1, S=0)=
		(4==((size.x-2)*(size.y-2))%8)?
		[
			[M,S],
			[S,M]
		]:undef;

	//draw the codeword bitmap at the given x,y
	//coordinates
	//uses size and corner type to split the codeword
	//across the edges of the symbol
	module draw_codeword(bitmap, x, y, size, corner, xadj, yadj)
	{
		if (x<0) {
			if ((corner) && (-y+4>size.y)) {
				drawcorner1(bitmap, size, corner);
				drawcorner2(bitmap, size, corner);
			} else {
				//offs cancels the x/y centering, leaving only the z centering
				offs1=center?[1.5+x/2,1.5,0]:[0,0,0];
				offs2=center?[-x/2,1.5,0]:[0,0,0];
				translate(offs1+[0,y,0])
					2dbitmap(colsplit(bitmap, x), pullback=pullback,
						vector_mode=vector_mode, center=center);
				translate(offs2+[size.x+x-2,y+yadj,0])
					2dbitmap(colsplit(bitmap, -x), pullback=pullback,
						vector_mode=vector_mode, center=center);
			}
		} else {
			if (y+2>=0) {
				//offs cancels the x/y centering, leaving only the z centering
				offs1=center?[1.5,-y/2,0]:[0,0,0];
				offs2=center?[1.5,y/2+1.5,0]:[0,0,0];
				translate(offs1+[x,y,0])
					2dbitmap(rowsplit(bitmap, y), pullback=pullback,
						vector_mode=vector_mode, center=center);
				translate(offs2+[x+xadj,-size.y+2,0])
					2dbitmap(rowsplit(bitmap, -y), pullback=pullback,
						vector_mode=vector_mode, center=center);
			} else {
				//offs cancels the x/y centering, leaving only the z centering
				offs=center?[1.5,1.5,0]:[0,0,0];
				translate(offs+[x,y,0])
					2dbitmap(bitmap, pullback=pullback,
						vector_mode=vector_mode, center=center);
			}
		}
	}

	//draw individual codewords from bytes array
	//this module is called recursively with i, x, y, and direction
	//iterating across the data region of the symbol
	//size and corner define the shape of the symbol
	module data_matrix_inner(bytes, size, corner, xadj, yadj, mark=1, space=0, i=0, x=-2, y=-5, direction=0)
	{
		//echo(str("DEBUG x=", x, " y=", y, " dir=", direction%2, " val=", bytes[i]));

		// convert the byte to a codeword bitmap
		bitmap=(bytes[i]==undef)?undef:dm_codeword(bytes[i], mark, space);

		// draw the codeword
		if (bitmap==undef)
		{
			//offs cancels the x/y centering, leaving only the z centering
			offs=center?[1,1,0]:[0,0,0];
			translate(offs+[size.x-4,-size.y+2,0])
				2dbitmap(unusedshape(size, mark, space), pullback=pullback,
					vector_mode=vector_mode, center=center);
		}
		else
		{
			draw_codeword(bitmap, x, y, size, corner, xadj, yadj);
		}

		// recurse
		if (i<len(bytes)) {
			if (direction%2) {
				if (x<0) {
					if (-y+2>=size.y) {
						new_dir = direction+1;
						new_x=x+5;
						new_y=y+1;
						data_matrix_inner(bytes, size, corner, xadj, yadj, mark, space, i+1, new_x, new_y, new_dir);
					} else if (-y+4>=size.y) {
						new_dir = direction+1;
						new_x=x+3;
						new_y=y-1;
						data_matrix_inner(bytes, size, corner, xadj, yadj, mark, space, i+1, new_x, new_y, new_dir);
					} else {
						new_dir = direction+1;
						new_x=x-2+1;
						new_y=y-2-3;
						data_matrix_inner(bytes, size, corner, xadj, yadj, mark, space, i+1, new_x, new_y, new_dir);
					}
				} else if (-y+2>=size.y) {
					new_dir = direction+1;
					new_x=x+2+3;
					new_y=y+2-1;
					data_matrix_inner(bytes, size, corner, xadj, yadj, mark, space, i+1, new_x, new_y, new_dir);
				} else {
					new_x=x-2;
					new_y=y-2;
					new_dir = direction;
					data_matrix_inner(bytes, size, corner, xadj, yadj, mark, space, i+1, new_x, new_y, new_dir);
				}
			} else {
				if ((y+2>0) || check_corner_collision(corner, size, x, y)) {
					new_dir = direction+1;
					new_x=x+2+1;
					new_y=y+2-3;
					data_matrix_inner(bytes, size, corner, xadj, yadj, mark, space,  i+1, new_x, new_y, new_dir);
				} else if (x+5>=size.x-2) {
					new_dir = direction+1;
					new_x=x-2+3;
					new_y=y-2-1;
					data_matrix_inner(bytes, size, corner, xadj, yadj, mark, space,  i+1, new_x, new_y, new_dir);
				} else {
					new_x=x+2;
					new_y=y+2;
					new_dir = direction;
					data_matrix_inner(bytes, size, corner, xadj, yadj, mark, space,  i+1, new_x, new_y, new_dir);
				}
			}
		}
	}


	// draw the symbol
	if (size != undef)
	{
		//general offset helpers for centering the barcode
		offs=center?[size.x/2,size.y/2]:[0,0];
		offs1=center?0.5:0;
		offs2=center?1:0;
		translate([2-offs.x-offs2,size.y-offs.y-offs2]) {
			//draw the data region
			data_matrix_inner(data_bytes, size, corner, xadj, yadj, mark, space);
			//draw the L finder pattern
			translate([-1+offs.x,-size.y+1+offs1])
				2dbitmap([[for (i=[0:size.x-1]) mark]], pullback=pullback,
					vector_mode=vector_mode, center=center);
			translate([-1+offs1,offs.y-size.y+2-offs1])
				2dbitmap([for (i=[0:size.y-2]) [mark]], pullback=pullback,
					vector_mode=vector_mode, center=center);
			//draw the clock track
			translate([offs.x-offs1,offs1])
				2dbitmap([[for (i=[0:size.x-2]) (i%2)?mark:space]],
					pullback=pullback, vector_mode=vector_mode,
					center=center);
			translate([size.x-2+offs1,offs.y-size.y+2-offs2])
				2dbitmap([for (i=[1:size.y-2]) [(i%2)?mark:space]],
					pullback=pullback, vector_mode=vector_mode,
					center=center);
			//draw the quiet zone
			translate([-2+offs2+offs.x,offs1-size.y])
				2dbitmap([[for (i=[0:size.x+1]) quiet_zone]],
					pullback=pullback, vector_mode=vector_mode,
					center=center);
			translate([-2+offs1,offs.y-size.y+1+offs1])
				2dbitmap([for (i=[0:size.y]) [quiet_zone]], pullback=pullback,
					vector_mode=vector_mode, center=center);
			translate([offs.x-1,1+offs1])
				2dbitmap([[for (i=[0:size.x-1]) quiet_zone]],
					pullback=pullback, vector_mode=vector_mode,
					center=center);
			translate([size.x-1+offs1,offs.y-size.y+1+offs1])
				2dbitmap([for (i=[1:size.y+1]) [quiet_zone]],
					pullback=pullback, vector_mode=vector_mode,
					center=center);
		}
	}
}

/* Examples */
example=5;
//example  0 - 10x10 - 3 data bytes, 5 ecc bytes - vector_mode example
//example  1 - 10x10 - 3 data bytes, 5 ecc bytes - expert_mode example
//example  2 - 12x12 - 5 data bytes, 7 ecc bytes
//example  3 - 12x12 - 5 data bytes, 7 ecc bytes - c40 mode
//example  4 - 14x14 - 8 data bytes, 10 ecc bytes - mixed-mode
//example  5 - 16x16 - 12 data bytes, 12 ecc bytes - From Wikipedia
//example  6 - 18x18 - 18 data bytes, 14 ecc bytes
//example  7 - 20x20 - 22 data bytes, 18 ecc bytes - fnc1 mode
//example  8 - 22x22 - 30 data bytes, 20 ecc bytes - From http://www.idautomation.com
//example  9 - 22x22 - 30 data bytes, 20 ecc bytes - text mode - From Wikipedia
//example 10 - 22x22 - 30 data bytes, 20 ecc bytes - dm_pad example
//example 11 - 22x22 - 30 data bytes, 20 ecc bytes - expert_mode example
//example 12 - 24x24 - 36 data bytes, 24 ecc bytes
//example 13 - 26x26 - 44 data bytes, 28 ecc bytes
//example 14 - 10x10 - 3 data bytes, 5 ecc bytes - base-256 mode example
//example 15 - same as example 4 but with center=true
//example 16 - same as example 5 but with center=true
//example 17 - same as example 6 but with center=true

if (example==0)
	data_matrix(dm_ascii("123456"), mark="black", vector_mode=true);

// This example is the same as example 0 but with expert_mode ecc bytes provided
// manually instead of using dm_ecc().
if (example==1)
	data_matrix(
		concat(
			dm_ascii("123456"),
			[114,25,5,88,102]
		),
		mark="black", expert_mode=true);

if (example==2)
	data_matrix(dm_ascii("17001164"), mark="black");

if (example==3)
	data_matrix(
		concat(
			c40_mode(),
			dm_c40("H0VLP7")
		),
		mark="black");

if (example==4)
	data_matrix(
		concat(
			c40_mode(),
			dm_c40("TELESI"),
			ascii_mode(),
			dm_ascii("S1")
		),
		mark="black");

if (example==5)
	data_matrix(dm_ascii("Wikipedia"), mark="black");

if (example==6)
	data_matrix(dm_ascii("Hourez Jonathan"), mark="black");

if (example==7)
	data_matrix(
		concat(
			[fnc1_mode()],
			dm_ascii("01034531200000111709112510ABCD1234")
		),
		mark="black");

if (example==8)
	data_matrix(dm_ascii("http://www.idautomation.com"), mark="black");

if (example==9)
	data_matrix(
		concat(
			text_mode(),
			dm_text("Wikipedia, the free encyclopedi"),
			ascii_mode(),
			dm_ascii("a")
		),
		mark="black");

// This example is the same as example 9 but using expert_mode with dm_pad().
if (example==10)
	data_matrix(
		dm_ecc(
			dm_pad(
				concat(
					text_mode(),
					dm_text("Wikipedia, the free encyclopedi"),
					ascii_mode(),
					dm_ascii("a")
				)
			)
		),
		mark="black", expert_mode=true);

// This example is the same as example 9 and 10 but adding the expert_mode
// padding and ecc bytes completely manually instead of using dm_pad().
if (example==11)
	data_matrix(
		concat(
			text_mode(),
			dm_text("Wikipedia, the free encyclopedi"),
			ascii_mode(),
			dm_ascii("a"),
			EOM(),
			[104,254,150,45,20,78,91,227,88,60,21,174,213,62,93,103,126,46,56,95,247,47,22,65]
		),
		mark="black", expert_mode=true);

if (example==12)
	data_matrix(dm_ascii("http://de.wikiquote.org/wiki/Zukunft"), mark="black");

if (example==13)
	data_matrix(
		dm_ascii("http://semapedia.org/v/Mixer_(consolle)/it"),
		mark="black");

// This example shows use of base-256 mode.
// The data is a single byte (63=0x3F='?').
if (example==14)
	data_matrix(
		dm_base256_append(
			[base256_mode()],
			[63],
			fills_symbol=true
		),
		mark="black");

// Same as example 4 but with center=true
if (example==15)
	data_matrix(
		concat(
			c40_mode(),
			dm_c40("TELESI"),
			ascii_mode(),
			dm_ascii("S1")
		),
		mark="black", center=true);

// Same as example 5 but with center=true
if (example==16)
	data_matrix(dm_ascii("Wikipedia"), mark="black", center=true);

// Same as example 6 but with center=true
if (example==17)
	data_matrix(dm_ascii("Hourez Jonathan"), mark="black", center=true);
